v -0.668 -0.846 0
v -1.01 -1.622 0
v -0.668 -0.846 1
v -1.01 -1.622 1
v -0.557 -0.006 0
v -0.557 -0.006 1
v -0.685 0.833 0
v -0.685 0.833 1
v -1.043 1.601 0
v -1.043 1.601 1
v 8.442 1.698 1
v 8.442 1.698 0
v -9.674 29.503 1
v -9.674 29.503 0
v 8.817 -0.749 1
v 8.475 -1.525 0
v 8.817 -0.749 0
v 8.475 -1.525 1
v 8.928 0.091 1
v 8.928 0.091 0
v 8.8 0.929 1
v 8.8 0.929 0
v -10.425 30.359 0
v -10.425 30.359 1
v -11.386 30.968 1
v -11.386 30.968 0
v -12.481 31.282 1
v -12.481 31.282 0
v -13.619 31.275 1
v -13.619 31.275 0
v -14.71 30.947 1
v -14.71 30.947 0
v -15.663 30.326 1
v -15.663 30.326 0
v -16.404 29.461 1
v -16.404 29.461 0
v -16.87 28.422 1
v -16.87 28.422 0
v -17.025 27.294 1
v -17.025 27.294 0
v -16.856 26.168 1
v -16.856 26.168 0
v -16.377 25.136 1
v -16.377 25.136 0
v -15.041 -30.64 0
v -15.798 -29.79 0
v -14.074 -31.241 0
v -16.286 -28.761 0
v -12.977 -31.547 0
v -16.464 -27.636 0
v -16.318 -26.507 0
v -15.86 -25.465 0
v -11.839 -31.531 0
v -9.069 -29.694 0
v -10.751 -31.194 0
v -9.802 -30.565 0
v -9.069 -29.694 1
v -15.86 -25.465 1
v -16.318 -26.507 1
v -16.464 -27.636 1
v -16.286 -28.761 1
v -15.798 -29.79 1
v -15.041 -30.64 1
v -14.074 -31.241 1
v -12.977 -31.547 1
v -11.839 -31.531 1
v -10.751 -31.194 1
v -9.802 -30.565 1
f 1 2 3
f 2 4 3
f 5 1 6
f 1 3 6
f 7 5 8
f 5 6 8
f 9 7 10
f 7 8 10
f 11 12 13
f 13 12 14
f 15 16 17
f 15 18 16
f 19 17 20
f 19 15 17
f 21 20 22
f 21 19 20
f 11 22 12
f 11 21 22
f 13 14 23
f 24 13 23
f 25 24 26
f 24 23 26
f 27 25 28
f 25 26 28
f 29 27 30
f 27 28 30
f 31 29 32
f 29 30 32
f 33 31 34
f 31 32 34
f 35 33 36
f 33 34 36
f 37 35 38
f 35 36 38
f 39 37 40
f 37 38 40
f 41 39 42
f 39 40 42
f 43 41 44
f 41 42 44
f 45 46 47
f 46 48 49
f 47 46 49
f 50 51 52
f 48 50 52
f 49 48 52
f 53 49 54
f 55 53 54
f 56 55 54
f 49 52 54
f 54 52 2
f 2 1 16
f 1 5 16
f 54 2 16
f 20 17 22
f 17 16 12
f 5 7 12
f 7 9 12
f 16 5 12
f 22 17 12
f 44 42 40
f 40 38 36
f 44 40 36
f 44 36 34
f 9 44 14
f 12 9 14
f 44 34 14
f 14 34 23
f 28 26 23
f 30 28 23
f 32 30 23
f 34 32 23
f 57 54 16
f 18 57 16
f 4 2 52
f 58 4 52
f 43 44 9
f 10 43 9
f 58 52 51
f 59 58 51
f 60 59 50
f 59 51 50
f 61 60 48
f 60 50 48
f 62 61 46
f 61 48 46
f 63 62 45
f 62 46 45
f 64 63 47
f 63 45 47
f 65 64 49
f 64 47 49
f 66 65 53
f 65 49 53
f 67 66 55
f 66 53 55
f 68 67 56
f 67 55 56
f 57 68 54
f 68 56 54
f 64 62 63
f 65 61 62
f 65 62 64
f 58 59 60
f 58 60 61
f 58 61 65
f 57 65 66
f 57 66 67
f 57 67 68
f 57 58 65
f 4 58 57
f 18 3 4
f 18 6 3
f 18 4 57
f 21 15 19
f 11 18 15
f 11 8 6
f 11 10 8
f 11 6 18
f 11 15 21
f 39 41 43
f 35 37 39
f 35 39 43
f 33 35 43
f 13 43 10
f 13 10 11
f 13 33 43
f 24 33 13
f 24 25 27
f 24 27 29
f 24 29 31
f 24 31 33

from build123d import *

# Parameters (mm, degrees)
BOSS_EXTRUDE1_DEPTH = 1
FILLET2_R           = 3


with BuildPart() as part:
    # Sketch1 → Boss-Extrude1 (new body)
    with BuildSketch(Plane.XY):
        with BuildLine():
            Line((0, 0), (-15.859714544, -25.465063412))
            ThreePointArc((-15.859714544, -25.465063412), (-14.579001361, -30.975033806), (-9.069030967, -29.694320624))
            Line((-9.069030967, -29.694320624), (9.485017571, 0.096885346))
            Line((9.485017571, 0.096885346), (-9.673704642, 29.502871699))
            ThreePointArc((-9.673704642, 29.502871699), (-15.208686496, 30.670765479), (-16.376580276, 25.135783626))
            Line((-16.376580276, 25.135783626), (0, 0))
        make_face()
    extrude(amount=BOSS_EXTRUDE1_DEPTH)

    # Fillet2
    fillet2_edges = [part.edges().sort_by_distance(p)[0] for p in [
        (9.485017571, 0.096885346, 0.5),
        (0, 0, 0.5),
    ]]
    fillet(fillet2_edges, radius=FILLET2_R)


solid = part.part
